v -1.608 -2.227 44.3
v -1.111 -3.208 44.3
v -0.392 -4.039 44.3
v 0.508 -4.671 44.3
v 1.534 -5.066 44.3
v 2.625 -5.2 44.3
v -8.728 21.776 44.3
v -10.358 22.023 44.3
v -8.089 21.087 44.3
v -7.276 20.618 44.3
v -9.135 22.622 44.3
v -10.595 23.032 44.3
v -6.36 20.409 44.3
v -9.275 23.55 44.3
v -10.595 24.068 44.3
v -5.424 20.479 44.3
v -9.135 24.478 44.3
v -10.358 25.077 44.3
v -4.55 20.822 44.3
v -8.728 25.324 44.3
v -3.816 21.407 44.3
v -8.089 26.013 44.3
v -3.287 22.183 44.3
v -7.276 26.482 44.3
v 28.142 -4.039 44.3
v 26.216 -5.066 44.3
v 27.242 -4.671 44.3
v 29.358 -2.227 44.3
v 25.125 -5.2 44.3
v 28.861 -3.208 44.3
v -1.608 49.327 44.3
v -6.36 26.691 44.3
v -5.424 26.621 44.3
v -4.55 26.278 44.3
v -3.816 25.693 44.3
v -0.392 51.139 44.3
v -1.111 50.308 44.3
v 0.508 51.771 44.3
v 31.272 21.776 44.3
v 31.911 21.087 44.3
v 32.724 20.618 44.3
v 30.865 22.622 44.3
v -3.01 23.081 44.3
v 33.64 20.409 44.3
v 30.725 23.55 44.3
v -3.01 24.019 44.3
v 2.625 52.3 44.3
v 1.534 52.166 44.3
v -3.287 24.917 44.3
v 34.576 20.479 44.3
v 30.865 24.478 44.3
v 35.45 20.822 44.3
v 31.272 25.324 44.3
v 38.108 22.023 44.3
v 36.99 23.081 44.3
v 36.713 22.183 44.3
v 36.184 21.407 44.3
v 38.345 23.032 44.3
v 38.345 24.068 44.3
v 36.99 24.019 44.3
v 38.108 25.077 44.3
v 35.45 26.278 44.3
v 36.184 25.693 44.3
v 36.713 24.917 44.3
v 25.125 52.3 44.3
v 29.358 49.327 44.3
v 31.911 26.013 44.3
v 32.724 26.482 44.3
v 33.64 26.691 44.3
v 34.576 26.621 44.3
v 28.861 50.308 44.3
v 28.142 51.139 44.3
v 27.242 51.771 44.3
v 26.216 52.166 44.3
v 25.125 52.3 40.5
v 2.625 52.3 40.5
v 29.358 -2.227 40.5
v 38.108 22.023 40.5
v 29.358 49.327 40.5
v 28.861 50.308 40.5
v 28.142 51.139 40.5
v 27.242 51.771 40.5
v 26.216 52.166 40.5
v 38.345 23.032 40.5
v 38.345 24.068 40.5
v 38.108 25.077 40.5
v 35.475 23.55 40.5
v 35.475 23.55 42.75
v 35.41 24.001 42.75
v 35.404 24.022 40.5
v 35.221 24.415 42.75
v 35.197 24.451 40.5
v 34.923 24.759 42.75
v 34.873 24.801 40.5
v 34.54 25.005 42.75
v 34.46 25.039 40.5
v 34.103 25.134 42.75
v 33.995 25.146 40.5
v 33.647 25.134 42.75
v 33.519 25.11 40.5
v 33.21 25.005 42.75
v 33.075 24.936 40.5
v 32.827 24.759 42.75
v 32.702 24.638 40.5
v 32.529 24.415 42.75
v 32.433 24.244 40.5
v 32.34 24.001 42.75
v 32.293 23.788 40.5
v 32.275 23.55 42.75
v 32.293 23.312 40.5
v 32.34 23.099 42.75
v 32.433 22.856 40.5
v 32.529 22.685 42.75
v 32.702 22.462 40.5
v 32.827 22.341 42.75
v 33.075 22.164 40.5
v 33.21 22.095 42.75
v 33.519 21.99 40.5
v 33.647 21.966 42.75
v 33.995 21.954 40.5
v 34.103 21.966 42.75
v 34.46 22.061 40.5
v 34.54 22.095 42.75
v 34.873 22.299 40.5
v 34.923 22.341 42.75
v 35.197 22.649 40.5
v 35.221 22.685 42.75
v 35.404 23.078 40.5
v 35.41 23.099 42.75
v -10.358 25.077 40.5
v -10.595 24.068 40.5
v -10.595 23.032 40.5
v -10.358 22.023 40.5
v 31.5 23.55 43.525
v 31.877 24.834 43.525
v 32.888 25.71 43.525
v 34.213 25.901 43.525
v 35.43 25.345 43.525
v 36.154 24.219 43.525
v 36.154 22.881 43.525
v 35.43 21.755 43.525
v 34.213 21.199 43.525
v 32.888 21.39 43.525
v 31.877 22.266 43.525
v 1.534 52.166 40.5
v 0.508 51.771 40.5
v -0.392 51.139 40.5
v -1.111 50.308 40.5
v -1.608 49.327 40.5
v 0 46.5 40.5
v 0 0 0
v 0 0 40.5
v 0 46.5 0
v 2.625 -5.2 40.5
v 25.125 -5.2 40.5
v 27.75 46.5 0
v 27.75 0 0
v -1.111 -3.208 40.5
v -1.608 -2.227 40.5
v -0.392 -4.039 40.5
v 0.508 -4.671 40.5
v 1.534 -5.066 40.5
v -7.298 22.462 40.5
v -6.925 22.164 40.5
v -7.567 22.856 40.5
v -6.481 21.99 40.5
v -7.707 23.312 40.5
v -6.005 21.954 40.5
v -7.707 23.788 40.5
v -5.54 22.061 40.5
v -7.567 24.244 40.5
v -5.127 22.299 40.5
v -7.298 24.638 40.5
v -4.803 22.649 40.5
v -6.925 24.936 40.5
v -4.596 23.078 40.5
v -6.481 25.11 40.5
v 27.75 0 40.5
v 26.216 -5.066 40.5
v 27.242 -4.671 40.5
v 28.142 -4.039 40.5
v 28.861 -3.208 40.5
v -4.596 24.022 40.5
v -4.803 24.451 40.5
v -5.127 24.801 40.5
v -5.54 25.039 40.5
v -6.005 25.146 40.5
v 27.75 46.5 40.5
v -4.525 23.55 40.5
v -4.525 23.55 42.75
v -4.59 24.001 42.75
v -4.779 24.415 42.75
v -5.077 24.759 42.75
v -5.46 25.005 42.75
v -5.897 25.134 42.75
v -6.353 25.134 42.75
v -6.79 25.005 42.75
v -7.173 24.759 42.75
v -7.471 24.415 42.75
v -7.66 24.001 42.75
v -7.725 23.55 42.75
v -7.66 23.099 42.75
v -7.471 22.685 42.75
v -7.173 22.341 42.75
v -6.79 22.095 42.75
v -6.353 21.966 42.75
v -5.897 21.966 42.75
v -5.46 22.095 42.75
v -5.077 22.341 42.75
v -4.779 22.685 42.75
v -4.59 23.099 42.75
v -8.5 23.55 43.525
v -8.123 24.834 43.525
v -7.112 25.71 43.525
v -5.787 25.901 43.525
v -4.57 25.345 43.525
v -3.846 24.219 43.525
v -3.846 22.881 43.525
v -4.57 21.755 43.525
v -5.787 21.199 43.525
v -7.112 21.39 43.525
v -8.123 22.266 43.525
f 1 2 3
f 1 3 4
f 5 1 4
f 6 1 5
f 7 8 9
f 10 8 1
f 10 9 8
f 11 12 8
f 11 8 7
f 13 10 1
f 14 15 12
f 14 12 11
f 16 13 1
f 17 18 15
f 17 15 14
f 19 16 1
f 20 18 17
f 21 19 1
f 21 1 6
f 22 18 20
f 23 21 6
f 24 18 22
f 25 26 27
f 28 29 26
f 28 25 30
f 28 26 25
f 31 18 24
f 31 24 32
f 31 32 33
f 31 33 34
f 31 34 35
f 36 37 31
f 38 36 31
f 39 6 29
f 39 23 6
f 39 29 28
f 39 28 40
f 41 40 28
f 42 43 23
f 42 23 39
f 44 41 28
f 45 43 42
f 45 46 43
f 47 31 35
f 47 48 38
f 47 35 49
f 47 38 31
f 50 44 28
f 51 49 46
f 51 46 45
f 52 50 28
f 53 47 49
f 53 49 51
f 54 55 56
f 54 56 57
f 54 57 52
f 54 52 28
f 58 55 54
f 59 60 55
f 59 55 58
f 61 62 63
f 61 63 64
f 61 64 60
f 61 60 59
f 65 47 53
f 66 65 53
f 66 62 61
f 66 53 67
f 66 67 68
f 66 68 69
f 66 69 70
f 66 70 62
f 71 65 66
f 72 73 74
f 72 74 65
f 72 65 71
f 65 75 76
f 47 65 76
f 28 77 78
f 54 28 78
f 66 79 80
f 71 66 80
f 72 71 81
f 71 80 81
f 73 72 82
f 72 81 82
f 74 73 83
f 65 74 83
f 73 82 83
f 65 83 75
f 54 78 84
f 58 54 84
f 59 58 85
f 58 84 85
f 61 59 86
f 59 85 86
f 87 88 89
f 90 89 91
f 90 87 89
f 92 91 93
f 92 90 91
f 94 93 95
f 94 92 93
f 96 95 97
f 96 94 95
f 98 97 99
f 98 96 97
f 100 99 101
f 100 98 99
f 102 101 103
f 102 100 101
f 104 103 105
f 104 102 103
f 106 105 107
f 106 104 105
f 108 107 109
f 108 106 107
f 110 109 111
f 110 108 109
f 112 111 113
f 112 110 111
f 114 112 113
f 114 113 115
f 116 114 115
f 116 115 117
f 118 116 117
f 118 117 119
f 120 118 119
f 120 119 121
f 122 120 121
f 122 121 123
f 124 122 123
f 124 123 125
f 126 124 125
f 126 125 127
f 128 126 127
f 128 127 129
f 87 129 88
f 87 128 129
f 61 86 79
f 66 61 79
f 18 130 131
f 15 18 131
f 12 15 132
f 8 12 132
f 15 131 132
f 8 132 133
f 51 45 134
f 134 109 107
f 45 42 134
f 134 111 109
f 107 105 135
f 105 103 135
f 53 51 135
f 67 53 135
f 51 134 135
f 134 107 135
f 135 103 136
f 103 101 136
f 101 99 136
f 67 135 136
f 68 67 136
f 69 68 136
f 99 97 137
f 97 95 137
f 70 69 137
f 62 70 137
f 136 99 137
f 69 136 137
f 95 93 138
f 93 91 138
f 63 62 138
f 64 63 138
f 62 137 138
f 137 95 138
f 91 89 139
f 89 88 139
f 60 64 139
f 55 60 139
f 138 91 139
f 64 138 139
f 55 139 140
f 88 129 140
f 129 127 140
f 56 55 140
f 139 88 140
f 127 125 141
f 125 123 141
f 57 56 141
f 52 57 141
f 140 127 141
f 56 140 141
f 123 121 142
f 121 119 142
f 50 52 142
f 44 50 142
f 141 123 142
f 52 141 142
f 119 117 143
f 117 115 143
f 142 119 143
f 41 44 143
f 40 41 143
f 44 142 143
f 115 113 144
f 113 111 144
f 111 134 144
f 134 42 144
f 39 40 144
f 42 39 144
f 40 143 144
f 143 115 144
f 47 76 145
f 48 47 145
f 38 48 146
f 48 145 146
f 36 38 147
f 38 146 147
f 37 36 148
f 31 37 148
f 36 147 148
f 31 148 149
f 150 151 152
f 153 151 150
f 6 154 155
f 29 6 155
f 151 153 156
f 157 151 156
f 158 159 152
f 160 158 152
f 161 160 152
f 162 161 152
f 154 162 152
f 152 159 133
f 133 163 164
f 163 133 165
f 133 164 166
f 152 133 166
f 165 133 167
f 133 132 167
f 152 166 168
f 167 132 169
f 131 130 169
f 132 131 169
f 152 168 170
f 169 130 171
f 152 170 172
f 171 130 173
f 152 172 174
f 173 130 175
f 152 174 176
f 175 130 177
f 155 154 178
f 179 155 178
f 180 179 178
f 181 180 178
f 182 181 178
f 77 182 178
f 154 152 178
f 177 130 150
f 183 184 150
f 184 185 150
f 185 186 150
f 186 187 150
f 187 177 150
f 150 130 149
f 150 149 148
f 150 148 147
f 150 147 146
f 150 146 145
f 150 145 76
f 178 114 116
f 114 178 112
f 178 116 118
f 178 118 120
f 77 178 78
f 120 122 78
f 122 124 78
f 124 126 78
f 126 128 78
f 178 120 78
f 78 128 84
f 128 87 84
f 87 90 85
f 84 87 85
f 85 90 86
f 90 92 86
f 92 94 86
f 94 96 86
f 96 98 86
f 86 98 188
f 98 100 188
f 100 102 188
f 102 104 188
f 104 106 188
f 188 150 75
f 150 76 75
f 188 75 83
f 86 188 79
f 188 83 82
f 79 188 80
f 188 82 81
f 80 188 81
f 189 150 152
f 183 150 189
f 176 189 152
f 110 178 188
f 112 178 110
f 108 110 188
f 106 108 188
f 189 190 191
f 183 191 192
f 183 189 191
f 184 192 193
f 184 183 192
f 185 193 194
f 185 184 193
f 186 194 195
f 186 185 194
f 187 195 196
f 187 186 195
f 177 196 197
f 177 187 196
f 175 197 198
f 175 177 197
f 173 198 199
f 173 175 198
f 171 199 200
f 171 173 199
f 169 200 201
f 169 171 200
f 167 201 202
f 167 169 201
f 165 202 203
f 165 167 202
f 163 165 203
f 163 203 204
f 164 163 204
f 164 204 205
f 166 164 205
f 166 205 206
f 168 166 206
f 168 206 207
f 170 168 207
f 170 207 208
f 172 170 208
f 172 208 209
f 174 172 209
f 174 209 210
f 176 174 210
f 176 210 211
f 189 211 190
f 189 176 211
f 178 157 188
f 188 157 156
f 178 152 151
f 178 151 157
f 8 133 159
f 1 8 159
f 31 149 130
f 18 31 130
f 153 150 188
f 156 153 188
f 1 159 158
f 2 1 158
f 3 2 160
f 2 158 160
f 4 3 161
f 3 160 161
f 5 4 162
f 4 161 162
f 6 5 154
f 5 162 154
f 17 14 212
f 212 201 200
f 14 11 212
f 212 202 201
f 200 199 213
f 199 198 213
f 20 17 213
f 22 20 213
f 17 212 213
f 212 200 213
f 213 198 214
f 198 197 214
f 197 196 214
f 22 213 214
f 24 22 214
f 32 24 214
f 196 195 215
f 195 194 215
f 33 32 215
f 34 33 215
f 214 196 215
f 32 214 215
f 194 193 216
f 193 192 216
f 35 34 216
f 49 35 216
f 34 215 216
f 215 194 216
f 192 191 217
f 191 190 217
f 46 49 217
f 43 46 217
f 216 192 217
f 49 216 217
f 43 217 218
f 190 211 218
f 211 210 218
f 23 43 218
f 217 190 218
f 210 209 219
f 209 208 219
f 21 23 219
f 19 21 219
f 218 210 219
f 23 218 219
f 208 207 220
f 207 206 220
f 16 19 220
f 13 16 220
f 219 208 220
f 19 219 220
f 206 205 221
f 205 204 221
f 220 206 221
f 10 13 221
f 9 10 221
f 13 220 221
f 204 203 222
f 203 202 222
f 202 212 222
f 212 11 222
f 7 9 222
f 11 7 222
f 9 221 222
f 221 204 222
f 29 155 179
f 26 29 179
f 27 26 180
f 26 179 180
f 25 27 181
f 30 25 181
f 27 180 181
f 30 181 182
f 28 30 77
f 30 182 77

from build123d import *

# Parameters (mm, degrees)
SKETCH1_W                                       = 27.75
SKETCH1_H                                       = 46.5
BOSS_EXTRUDE1_DEPTH                             = 40.5
SKETCH2_R                                       = 1.6
BOSS_EXTRUDE2_DEPTH                             = 3.8
CSK_FOR_M3_FLAT_HEAD_MACHINE_SCREW1_D           = 3.2
CSK_FOR_M3_FLAT_HEAD_MACHINE_SCREW1_CSINK_D     = 6.3
CSK_FOR_M3_FLAT_HEAD_MACHINE_SCREW1_CSINK_ANGLE = 90


with BuildPart() as part:
    # Sketch1 → Boss-Extrude1 (new body)
    with BuildSketch(Plane.XY):
        with Locations((13.875, 23.25)):
            Rectangle(SKETCH1_W, SKETCH1_H)
    extrude(amount=BOSS_EXTRUDE1_DEPTH)

    # Sketch2 → Boss-Extrude2 (add)
    with BuildSketch(Plane.XY.offset(40.5)):
        with BuildLine():
            Line((2.625, -5.2), (25.125, -5.2))
            ThreePointArc((25.125, -5.2), (27.711215896, -4.382592475), (29.357879644, -2.227327706))
            Line((29.357879644, -2.227327706), (38.107879644, 22.022672294))
            ThreePointArc((38.107879644, 22.022672294), (38.375, 23.55), (38.107879644, 25.077327706))
            Line((38.107879644, 25.077327706), (29.357879644, 49.327327706))
            ThreePointArc((29.357879644, 49.327327706), (27.711215896, 51.482592475), (25.125, 52.3))
            Line((25.125, 52.3), (2.625, 52.3))
            ThreePointArc((2.625, 52.3), (0.038784104, 51.482592475), (-1.607879644, 49.327327706))
            Line((-1.607879644, 49.327327706), (-10.357879644, 25.077327706))
            ThreePointArc((-10.357879644, 25.077327706), (-10.625, 23.55), (-10.357879644, 22.022672294))
            Line((-10.357879644, 22.022672294), (-1.607879644, -2.227327706))
            ThreePointArc((-1.607879644, -2.227327706), (0.038784104, -4.382592475), (2.625, -5.2))
        make_face()
        with Locations((-6.125, 23.55)):
            Circle(SKETCH2_R, mode=Mode.SUBTRACT)
        with Locations((33.875, 23.55)):
            Circle(SKETCH2_R, mode=Mode.SUBTRACT)
    extrude(amount=BOSS_EXTRUDE2_DEPTH)

    # CSK for M3 Flat Head Machine Screw1 (through all)
    with Locations(Plane.XY.offset(44.3)):
        with Locations((-6.125, 23.55), (33.875, 23.55)):
            CounterSinkHole(CSK_FOR_M3_FLAT_HEAD_MACHINE_SCREW1_D / 2, CSK_FOR_M3_FLAT_HEAD_MACHINE_SCREW1_CSINK_D / 2, counter_sink_angle=CSK_FOR_M3_FLAT_HEAD_MACHINE_SCREW1_CSINK_ANGLE)


solid = part.part
